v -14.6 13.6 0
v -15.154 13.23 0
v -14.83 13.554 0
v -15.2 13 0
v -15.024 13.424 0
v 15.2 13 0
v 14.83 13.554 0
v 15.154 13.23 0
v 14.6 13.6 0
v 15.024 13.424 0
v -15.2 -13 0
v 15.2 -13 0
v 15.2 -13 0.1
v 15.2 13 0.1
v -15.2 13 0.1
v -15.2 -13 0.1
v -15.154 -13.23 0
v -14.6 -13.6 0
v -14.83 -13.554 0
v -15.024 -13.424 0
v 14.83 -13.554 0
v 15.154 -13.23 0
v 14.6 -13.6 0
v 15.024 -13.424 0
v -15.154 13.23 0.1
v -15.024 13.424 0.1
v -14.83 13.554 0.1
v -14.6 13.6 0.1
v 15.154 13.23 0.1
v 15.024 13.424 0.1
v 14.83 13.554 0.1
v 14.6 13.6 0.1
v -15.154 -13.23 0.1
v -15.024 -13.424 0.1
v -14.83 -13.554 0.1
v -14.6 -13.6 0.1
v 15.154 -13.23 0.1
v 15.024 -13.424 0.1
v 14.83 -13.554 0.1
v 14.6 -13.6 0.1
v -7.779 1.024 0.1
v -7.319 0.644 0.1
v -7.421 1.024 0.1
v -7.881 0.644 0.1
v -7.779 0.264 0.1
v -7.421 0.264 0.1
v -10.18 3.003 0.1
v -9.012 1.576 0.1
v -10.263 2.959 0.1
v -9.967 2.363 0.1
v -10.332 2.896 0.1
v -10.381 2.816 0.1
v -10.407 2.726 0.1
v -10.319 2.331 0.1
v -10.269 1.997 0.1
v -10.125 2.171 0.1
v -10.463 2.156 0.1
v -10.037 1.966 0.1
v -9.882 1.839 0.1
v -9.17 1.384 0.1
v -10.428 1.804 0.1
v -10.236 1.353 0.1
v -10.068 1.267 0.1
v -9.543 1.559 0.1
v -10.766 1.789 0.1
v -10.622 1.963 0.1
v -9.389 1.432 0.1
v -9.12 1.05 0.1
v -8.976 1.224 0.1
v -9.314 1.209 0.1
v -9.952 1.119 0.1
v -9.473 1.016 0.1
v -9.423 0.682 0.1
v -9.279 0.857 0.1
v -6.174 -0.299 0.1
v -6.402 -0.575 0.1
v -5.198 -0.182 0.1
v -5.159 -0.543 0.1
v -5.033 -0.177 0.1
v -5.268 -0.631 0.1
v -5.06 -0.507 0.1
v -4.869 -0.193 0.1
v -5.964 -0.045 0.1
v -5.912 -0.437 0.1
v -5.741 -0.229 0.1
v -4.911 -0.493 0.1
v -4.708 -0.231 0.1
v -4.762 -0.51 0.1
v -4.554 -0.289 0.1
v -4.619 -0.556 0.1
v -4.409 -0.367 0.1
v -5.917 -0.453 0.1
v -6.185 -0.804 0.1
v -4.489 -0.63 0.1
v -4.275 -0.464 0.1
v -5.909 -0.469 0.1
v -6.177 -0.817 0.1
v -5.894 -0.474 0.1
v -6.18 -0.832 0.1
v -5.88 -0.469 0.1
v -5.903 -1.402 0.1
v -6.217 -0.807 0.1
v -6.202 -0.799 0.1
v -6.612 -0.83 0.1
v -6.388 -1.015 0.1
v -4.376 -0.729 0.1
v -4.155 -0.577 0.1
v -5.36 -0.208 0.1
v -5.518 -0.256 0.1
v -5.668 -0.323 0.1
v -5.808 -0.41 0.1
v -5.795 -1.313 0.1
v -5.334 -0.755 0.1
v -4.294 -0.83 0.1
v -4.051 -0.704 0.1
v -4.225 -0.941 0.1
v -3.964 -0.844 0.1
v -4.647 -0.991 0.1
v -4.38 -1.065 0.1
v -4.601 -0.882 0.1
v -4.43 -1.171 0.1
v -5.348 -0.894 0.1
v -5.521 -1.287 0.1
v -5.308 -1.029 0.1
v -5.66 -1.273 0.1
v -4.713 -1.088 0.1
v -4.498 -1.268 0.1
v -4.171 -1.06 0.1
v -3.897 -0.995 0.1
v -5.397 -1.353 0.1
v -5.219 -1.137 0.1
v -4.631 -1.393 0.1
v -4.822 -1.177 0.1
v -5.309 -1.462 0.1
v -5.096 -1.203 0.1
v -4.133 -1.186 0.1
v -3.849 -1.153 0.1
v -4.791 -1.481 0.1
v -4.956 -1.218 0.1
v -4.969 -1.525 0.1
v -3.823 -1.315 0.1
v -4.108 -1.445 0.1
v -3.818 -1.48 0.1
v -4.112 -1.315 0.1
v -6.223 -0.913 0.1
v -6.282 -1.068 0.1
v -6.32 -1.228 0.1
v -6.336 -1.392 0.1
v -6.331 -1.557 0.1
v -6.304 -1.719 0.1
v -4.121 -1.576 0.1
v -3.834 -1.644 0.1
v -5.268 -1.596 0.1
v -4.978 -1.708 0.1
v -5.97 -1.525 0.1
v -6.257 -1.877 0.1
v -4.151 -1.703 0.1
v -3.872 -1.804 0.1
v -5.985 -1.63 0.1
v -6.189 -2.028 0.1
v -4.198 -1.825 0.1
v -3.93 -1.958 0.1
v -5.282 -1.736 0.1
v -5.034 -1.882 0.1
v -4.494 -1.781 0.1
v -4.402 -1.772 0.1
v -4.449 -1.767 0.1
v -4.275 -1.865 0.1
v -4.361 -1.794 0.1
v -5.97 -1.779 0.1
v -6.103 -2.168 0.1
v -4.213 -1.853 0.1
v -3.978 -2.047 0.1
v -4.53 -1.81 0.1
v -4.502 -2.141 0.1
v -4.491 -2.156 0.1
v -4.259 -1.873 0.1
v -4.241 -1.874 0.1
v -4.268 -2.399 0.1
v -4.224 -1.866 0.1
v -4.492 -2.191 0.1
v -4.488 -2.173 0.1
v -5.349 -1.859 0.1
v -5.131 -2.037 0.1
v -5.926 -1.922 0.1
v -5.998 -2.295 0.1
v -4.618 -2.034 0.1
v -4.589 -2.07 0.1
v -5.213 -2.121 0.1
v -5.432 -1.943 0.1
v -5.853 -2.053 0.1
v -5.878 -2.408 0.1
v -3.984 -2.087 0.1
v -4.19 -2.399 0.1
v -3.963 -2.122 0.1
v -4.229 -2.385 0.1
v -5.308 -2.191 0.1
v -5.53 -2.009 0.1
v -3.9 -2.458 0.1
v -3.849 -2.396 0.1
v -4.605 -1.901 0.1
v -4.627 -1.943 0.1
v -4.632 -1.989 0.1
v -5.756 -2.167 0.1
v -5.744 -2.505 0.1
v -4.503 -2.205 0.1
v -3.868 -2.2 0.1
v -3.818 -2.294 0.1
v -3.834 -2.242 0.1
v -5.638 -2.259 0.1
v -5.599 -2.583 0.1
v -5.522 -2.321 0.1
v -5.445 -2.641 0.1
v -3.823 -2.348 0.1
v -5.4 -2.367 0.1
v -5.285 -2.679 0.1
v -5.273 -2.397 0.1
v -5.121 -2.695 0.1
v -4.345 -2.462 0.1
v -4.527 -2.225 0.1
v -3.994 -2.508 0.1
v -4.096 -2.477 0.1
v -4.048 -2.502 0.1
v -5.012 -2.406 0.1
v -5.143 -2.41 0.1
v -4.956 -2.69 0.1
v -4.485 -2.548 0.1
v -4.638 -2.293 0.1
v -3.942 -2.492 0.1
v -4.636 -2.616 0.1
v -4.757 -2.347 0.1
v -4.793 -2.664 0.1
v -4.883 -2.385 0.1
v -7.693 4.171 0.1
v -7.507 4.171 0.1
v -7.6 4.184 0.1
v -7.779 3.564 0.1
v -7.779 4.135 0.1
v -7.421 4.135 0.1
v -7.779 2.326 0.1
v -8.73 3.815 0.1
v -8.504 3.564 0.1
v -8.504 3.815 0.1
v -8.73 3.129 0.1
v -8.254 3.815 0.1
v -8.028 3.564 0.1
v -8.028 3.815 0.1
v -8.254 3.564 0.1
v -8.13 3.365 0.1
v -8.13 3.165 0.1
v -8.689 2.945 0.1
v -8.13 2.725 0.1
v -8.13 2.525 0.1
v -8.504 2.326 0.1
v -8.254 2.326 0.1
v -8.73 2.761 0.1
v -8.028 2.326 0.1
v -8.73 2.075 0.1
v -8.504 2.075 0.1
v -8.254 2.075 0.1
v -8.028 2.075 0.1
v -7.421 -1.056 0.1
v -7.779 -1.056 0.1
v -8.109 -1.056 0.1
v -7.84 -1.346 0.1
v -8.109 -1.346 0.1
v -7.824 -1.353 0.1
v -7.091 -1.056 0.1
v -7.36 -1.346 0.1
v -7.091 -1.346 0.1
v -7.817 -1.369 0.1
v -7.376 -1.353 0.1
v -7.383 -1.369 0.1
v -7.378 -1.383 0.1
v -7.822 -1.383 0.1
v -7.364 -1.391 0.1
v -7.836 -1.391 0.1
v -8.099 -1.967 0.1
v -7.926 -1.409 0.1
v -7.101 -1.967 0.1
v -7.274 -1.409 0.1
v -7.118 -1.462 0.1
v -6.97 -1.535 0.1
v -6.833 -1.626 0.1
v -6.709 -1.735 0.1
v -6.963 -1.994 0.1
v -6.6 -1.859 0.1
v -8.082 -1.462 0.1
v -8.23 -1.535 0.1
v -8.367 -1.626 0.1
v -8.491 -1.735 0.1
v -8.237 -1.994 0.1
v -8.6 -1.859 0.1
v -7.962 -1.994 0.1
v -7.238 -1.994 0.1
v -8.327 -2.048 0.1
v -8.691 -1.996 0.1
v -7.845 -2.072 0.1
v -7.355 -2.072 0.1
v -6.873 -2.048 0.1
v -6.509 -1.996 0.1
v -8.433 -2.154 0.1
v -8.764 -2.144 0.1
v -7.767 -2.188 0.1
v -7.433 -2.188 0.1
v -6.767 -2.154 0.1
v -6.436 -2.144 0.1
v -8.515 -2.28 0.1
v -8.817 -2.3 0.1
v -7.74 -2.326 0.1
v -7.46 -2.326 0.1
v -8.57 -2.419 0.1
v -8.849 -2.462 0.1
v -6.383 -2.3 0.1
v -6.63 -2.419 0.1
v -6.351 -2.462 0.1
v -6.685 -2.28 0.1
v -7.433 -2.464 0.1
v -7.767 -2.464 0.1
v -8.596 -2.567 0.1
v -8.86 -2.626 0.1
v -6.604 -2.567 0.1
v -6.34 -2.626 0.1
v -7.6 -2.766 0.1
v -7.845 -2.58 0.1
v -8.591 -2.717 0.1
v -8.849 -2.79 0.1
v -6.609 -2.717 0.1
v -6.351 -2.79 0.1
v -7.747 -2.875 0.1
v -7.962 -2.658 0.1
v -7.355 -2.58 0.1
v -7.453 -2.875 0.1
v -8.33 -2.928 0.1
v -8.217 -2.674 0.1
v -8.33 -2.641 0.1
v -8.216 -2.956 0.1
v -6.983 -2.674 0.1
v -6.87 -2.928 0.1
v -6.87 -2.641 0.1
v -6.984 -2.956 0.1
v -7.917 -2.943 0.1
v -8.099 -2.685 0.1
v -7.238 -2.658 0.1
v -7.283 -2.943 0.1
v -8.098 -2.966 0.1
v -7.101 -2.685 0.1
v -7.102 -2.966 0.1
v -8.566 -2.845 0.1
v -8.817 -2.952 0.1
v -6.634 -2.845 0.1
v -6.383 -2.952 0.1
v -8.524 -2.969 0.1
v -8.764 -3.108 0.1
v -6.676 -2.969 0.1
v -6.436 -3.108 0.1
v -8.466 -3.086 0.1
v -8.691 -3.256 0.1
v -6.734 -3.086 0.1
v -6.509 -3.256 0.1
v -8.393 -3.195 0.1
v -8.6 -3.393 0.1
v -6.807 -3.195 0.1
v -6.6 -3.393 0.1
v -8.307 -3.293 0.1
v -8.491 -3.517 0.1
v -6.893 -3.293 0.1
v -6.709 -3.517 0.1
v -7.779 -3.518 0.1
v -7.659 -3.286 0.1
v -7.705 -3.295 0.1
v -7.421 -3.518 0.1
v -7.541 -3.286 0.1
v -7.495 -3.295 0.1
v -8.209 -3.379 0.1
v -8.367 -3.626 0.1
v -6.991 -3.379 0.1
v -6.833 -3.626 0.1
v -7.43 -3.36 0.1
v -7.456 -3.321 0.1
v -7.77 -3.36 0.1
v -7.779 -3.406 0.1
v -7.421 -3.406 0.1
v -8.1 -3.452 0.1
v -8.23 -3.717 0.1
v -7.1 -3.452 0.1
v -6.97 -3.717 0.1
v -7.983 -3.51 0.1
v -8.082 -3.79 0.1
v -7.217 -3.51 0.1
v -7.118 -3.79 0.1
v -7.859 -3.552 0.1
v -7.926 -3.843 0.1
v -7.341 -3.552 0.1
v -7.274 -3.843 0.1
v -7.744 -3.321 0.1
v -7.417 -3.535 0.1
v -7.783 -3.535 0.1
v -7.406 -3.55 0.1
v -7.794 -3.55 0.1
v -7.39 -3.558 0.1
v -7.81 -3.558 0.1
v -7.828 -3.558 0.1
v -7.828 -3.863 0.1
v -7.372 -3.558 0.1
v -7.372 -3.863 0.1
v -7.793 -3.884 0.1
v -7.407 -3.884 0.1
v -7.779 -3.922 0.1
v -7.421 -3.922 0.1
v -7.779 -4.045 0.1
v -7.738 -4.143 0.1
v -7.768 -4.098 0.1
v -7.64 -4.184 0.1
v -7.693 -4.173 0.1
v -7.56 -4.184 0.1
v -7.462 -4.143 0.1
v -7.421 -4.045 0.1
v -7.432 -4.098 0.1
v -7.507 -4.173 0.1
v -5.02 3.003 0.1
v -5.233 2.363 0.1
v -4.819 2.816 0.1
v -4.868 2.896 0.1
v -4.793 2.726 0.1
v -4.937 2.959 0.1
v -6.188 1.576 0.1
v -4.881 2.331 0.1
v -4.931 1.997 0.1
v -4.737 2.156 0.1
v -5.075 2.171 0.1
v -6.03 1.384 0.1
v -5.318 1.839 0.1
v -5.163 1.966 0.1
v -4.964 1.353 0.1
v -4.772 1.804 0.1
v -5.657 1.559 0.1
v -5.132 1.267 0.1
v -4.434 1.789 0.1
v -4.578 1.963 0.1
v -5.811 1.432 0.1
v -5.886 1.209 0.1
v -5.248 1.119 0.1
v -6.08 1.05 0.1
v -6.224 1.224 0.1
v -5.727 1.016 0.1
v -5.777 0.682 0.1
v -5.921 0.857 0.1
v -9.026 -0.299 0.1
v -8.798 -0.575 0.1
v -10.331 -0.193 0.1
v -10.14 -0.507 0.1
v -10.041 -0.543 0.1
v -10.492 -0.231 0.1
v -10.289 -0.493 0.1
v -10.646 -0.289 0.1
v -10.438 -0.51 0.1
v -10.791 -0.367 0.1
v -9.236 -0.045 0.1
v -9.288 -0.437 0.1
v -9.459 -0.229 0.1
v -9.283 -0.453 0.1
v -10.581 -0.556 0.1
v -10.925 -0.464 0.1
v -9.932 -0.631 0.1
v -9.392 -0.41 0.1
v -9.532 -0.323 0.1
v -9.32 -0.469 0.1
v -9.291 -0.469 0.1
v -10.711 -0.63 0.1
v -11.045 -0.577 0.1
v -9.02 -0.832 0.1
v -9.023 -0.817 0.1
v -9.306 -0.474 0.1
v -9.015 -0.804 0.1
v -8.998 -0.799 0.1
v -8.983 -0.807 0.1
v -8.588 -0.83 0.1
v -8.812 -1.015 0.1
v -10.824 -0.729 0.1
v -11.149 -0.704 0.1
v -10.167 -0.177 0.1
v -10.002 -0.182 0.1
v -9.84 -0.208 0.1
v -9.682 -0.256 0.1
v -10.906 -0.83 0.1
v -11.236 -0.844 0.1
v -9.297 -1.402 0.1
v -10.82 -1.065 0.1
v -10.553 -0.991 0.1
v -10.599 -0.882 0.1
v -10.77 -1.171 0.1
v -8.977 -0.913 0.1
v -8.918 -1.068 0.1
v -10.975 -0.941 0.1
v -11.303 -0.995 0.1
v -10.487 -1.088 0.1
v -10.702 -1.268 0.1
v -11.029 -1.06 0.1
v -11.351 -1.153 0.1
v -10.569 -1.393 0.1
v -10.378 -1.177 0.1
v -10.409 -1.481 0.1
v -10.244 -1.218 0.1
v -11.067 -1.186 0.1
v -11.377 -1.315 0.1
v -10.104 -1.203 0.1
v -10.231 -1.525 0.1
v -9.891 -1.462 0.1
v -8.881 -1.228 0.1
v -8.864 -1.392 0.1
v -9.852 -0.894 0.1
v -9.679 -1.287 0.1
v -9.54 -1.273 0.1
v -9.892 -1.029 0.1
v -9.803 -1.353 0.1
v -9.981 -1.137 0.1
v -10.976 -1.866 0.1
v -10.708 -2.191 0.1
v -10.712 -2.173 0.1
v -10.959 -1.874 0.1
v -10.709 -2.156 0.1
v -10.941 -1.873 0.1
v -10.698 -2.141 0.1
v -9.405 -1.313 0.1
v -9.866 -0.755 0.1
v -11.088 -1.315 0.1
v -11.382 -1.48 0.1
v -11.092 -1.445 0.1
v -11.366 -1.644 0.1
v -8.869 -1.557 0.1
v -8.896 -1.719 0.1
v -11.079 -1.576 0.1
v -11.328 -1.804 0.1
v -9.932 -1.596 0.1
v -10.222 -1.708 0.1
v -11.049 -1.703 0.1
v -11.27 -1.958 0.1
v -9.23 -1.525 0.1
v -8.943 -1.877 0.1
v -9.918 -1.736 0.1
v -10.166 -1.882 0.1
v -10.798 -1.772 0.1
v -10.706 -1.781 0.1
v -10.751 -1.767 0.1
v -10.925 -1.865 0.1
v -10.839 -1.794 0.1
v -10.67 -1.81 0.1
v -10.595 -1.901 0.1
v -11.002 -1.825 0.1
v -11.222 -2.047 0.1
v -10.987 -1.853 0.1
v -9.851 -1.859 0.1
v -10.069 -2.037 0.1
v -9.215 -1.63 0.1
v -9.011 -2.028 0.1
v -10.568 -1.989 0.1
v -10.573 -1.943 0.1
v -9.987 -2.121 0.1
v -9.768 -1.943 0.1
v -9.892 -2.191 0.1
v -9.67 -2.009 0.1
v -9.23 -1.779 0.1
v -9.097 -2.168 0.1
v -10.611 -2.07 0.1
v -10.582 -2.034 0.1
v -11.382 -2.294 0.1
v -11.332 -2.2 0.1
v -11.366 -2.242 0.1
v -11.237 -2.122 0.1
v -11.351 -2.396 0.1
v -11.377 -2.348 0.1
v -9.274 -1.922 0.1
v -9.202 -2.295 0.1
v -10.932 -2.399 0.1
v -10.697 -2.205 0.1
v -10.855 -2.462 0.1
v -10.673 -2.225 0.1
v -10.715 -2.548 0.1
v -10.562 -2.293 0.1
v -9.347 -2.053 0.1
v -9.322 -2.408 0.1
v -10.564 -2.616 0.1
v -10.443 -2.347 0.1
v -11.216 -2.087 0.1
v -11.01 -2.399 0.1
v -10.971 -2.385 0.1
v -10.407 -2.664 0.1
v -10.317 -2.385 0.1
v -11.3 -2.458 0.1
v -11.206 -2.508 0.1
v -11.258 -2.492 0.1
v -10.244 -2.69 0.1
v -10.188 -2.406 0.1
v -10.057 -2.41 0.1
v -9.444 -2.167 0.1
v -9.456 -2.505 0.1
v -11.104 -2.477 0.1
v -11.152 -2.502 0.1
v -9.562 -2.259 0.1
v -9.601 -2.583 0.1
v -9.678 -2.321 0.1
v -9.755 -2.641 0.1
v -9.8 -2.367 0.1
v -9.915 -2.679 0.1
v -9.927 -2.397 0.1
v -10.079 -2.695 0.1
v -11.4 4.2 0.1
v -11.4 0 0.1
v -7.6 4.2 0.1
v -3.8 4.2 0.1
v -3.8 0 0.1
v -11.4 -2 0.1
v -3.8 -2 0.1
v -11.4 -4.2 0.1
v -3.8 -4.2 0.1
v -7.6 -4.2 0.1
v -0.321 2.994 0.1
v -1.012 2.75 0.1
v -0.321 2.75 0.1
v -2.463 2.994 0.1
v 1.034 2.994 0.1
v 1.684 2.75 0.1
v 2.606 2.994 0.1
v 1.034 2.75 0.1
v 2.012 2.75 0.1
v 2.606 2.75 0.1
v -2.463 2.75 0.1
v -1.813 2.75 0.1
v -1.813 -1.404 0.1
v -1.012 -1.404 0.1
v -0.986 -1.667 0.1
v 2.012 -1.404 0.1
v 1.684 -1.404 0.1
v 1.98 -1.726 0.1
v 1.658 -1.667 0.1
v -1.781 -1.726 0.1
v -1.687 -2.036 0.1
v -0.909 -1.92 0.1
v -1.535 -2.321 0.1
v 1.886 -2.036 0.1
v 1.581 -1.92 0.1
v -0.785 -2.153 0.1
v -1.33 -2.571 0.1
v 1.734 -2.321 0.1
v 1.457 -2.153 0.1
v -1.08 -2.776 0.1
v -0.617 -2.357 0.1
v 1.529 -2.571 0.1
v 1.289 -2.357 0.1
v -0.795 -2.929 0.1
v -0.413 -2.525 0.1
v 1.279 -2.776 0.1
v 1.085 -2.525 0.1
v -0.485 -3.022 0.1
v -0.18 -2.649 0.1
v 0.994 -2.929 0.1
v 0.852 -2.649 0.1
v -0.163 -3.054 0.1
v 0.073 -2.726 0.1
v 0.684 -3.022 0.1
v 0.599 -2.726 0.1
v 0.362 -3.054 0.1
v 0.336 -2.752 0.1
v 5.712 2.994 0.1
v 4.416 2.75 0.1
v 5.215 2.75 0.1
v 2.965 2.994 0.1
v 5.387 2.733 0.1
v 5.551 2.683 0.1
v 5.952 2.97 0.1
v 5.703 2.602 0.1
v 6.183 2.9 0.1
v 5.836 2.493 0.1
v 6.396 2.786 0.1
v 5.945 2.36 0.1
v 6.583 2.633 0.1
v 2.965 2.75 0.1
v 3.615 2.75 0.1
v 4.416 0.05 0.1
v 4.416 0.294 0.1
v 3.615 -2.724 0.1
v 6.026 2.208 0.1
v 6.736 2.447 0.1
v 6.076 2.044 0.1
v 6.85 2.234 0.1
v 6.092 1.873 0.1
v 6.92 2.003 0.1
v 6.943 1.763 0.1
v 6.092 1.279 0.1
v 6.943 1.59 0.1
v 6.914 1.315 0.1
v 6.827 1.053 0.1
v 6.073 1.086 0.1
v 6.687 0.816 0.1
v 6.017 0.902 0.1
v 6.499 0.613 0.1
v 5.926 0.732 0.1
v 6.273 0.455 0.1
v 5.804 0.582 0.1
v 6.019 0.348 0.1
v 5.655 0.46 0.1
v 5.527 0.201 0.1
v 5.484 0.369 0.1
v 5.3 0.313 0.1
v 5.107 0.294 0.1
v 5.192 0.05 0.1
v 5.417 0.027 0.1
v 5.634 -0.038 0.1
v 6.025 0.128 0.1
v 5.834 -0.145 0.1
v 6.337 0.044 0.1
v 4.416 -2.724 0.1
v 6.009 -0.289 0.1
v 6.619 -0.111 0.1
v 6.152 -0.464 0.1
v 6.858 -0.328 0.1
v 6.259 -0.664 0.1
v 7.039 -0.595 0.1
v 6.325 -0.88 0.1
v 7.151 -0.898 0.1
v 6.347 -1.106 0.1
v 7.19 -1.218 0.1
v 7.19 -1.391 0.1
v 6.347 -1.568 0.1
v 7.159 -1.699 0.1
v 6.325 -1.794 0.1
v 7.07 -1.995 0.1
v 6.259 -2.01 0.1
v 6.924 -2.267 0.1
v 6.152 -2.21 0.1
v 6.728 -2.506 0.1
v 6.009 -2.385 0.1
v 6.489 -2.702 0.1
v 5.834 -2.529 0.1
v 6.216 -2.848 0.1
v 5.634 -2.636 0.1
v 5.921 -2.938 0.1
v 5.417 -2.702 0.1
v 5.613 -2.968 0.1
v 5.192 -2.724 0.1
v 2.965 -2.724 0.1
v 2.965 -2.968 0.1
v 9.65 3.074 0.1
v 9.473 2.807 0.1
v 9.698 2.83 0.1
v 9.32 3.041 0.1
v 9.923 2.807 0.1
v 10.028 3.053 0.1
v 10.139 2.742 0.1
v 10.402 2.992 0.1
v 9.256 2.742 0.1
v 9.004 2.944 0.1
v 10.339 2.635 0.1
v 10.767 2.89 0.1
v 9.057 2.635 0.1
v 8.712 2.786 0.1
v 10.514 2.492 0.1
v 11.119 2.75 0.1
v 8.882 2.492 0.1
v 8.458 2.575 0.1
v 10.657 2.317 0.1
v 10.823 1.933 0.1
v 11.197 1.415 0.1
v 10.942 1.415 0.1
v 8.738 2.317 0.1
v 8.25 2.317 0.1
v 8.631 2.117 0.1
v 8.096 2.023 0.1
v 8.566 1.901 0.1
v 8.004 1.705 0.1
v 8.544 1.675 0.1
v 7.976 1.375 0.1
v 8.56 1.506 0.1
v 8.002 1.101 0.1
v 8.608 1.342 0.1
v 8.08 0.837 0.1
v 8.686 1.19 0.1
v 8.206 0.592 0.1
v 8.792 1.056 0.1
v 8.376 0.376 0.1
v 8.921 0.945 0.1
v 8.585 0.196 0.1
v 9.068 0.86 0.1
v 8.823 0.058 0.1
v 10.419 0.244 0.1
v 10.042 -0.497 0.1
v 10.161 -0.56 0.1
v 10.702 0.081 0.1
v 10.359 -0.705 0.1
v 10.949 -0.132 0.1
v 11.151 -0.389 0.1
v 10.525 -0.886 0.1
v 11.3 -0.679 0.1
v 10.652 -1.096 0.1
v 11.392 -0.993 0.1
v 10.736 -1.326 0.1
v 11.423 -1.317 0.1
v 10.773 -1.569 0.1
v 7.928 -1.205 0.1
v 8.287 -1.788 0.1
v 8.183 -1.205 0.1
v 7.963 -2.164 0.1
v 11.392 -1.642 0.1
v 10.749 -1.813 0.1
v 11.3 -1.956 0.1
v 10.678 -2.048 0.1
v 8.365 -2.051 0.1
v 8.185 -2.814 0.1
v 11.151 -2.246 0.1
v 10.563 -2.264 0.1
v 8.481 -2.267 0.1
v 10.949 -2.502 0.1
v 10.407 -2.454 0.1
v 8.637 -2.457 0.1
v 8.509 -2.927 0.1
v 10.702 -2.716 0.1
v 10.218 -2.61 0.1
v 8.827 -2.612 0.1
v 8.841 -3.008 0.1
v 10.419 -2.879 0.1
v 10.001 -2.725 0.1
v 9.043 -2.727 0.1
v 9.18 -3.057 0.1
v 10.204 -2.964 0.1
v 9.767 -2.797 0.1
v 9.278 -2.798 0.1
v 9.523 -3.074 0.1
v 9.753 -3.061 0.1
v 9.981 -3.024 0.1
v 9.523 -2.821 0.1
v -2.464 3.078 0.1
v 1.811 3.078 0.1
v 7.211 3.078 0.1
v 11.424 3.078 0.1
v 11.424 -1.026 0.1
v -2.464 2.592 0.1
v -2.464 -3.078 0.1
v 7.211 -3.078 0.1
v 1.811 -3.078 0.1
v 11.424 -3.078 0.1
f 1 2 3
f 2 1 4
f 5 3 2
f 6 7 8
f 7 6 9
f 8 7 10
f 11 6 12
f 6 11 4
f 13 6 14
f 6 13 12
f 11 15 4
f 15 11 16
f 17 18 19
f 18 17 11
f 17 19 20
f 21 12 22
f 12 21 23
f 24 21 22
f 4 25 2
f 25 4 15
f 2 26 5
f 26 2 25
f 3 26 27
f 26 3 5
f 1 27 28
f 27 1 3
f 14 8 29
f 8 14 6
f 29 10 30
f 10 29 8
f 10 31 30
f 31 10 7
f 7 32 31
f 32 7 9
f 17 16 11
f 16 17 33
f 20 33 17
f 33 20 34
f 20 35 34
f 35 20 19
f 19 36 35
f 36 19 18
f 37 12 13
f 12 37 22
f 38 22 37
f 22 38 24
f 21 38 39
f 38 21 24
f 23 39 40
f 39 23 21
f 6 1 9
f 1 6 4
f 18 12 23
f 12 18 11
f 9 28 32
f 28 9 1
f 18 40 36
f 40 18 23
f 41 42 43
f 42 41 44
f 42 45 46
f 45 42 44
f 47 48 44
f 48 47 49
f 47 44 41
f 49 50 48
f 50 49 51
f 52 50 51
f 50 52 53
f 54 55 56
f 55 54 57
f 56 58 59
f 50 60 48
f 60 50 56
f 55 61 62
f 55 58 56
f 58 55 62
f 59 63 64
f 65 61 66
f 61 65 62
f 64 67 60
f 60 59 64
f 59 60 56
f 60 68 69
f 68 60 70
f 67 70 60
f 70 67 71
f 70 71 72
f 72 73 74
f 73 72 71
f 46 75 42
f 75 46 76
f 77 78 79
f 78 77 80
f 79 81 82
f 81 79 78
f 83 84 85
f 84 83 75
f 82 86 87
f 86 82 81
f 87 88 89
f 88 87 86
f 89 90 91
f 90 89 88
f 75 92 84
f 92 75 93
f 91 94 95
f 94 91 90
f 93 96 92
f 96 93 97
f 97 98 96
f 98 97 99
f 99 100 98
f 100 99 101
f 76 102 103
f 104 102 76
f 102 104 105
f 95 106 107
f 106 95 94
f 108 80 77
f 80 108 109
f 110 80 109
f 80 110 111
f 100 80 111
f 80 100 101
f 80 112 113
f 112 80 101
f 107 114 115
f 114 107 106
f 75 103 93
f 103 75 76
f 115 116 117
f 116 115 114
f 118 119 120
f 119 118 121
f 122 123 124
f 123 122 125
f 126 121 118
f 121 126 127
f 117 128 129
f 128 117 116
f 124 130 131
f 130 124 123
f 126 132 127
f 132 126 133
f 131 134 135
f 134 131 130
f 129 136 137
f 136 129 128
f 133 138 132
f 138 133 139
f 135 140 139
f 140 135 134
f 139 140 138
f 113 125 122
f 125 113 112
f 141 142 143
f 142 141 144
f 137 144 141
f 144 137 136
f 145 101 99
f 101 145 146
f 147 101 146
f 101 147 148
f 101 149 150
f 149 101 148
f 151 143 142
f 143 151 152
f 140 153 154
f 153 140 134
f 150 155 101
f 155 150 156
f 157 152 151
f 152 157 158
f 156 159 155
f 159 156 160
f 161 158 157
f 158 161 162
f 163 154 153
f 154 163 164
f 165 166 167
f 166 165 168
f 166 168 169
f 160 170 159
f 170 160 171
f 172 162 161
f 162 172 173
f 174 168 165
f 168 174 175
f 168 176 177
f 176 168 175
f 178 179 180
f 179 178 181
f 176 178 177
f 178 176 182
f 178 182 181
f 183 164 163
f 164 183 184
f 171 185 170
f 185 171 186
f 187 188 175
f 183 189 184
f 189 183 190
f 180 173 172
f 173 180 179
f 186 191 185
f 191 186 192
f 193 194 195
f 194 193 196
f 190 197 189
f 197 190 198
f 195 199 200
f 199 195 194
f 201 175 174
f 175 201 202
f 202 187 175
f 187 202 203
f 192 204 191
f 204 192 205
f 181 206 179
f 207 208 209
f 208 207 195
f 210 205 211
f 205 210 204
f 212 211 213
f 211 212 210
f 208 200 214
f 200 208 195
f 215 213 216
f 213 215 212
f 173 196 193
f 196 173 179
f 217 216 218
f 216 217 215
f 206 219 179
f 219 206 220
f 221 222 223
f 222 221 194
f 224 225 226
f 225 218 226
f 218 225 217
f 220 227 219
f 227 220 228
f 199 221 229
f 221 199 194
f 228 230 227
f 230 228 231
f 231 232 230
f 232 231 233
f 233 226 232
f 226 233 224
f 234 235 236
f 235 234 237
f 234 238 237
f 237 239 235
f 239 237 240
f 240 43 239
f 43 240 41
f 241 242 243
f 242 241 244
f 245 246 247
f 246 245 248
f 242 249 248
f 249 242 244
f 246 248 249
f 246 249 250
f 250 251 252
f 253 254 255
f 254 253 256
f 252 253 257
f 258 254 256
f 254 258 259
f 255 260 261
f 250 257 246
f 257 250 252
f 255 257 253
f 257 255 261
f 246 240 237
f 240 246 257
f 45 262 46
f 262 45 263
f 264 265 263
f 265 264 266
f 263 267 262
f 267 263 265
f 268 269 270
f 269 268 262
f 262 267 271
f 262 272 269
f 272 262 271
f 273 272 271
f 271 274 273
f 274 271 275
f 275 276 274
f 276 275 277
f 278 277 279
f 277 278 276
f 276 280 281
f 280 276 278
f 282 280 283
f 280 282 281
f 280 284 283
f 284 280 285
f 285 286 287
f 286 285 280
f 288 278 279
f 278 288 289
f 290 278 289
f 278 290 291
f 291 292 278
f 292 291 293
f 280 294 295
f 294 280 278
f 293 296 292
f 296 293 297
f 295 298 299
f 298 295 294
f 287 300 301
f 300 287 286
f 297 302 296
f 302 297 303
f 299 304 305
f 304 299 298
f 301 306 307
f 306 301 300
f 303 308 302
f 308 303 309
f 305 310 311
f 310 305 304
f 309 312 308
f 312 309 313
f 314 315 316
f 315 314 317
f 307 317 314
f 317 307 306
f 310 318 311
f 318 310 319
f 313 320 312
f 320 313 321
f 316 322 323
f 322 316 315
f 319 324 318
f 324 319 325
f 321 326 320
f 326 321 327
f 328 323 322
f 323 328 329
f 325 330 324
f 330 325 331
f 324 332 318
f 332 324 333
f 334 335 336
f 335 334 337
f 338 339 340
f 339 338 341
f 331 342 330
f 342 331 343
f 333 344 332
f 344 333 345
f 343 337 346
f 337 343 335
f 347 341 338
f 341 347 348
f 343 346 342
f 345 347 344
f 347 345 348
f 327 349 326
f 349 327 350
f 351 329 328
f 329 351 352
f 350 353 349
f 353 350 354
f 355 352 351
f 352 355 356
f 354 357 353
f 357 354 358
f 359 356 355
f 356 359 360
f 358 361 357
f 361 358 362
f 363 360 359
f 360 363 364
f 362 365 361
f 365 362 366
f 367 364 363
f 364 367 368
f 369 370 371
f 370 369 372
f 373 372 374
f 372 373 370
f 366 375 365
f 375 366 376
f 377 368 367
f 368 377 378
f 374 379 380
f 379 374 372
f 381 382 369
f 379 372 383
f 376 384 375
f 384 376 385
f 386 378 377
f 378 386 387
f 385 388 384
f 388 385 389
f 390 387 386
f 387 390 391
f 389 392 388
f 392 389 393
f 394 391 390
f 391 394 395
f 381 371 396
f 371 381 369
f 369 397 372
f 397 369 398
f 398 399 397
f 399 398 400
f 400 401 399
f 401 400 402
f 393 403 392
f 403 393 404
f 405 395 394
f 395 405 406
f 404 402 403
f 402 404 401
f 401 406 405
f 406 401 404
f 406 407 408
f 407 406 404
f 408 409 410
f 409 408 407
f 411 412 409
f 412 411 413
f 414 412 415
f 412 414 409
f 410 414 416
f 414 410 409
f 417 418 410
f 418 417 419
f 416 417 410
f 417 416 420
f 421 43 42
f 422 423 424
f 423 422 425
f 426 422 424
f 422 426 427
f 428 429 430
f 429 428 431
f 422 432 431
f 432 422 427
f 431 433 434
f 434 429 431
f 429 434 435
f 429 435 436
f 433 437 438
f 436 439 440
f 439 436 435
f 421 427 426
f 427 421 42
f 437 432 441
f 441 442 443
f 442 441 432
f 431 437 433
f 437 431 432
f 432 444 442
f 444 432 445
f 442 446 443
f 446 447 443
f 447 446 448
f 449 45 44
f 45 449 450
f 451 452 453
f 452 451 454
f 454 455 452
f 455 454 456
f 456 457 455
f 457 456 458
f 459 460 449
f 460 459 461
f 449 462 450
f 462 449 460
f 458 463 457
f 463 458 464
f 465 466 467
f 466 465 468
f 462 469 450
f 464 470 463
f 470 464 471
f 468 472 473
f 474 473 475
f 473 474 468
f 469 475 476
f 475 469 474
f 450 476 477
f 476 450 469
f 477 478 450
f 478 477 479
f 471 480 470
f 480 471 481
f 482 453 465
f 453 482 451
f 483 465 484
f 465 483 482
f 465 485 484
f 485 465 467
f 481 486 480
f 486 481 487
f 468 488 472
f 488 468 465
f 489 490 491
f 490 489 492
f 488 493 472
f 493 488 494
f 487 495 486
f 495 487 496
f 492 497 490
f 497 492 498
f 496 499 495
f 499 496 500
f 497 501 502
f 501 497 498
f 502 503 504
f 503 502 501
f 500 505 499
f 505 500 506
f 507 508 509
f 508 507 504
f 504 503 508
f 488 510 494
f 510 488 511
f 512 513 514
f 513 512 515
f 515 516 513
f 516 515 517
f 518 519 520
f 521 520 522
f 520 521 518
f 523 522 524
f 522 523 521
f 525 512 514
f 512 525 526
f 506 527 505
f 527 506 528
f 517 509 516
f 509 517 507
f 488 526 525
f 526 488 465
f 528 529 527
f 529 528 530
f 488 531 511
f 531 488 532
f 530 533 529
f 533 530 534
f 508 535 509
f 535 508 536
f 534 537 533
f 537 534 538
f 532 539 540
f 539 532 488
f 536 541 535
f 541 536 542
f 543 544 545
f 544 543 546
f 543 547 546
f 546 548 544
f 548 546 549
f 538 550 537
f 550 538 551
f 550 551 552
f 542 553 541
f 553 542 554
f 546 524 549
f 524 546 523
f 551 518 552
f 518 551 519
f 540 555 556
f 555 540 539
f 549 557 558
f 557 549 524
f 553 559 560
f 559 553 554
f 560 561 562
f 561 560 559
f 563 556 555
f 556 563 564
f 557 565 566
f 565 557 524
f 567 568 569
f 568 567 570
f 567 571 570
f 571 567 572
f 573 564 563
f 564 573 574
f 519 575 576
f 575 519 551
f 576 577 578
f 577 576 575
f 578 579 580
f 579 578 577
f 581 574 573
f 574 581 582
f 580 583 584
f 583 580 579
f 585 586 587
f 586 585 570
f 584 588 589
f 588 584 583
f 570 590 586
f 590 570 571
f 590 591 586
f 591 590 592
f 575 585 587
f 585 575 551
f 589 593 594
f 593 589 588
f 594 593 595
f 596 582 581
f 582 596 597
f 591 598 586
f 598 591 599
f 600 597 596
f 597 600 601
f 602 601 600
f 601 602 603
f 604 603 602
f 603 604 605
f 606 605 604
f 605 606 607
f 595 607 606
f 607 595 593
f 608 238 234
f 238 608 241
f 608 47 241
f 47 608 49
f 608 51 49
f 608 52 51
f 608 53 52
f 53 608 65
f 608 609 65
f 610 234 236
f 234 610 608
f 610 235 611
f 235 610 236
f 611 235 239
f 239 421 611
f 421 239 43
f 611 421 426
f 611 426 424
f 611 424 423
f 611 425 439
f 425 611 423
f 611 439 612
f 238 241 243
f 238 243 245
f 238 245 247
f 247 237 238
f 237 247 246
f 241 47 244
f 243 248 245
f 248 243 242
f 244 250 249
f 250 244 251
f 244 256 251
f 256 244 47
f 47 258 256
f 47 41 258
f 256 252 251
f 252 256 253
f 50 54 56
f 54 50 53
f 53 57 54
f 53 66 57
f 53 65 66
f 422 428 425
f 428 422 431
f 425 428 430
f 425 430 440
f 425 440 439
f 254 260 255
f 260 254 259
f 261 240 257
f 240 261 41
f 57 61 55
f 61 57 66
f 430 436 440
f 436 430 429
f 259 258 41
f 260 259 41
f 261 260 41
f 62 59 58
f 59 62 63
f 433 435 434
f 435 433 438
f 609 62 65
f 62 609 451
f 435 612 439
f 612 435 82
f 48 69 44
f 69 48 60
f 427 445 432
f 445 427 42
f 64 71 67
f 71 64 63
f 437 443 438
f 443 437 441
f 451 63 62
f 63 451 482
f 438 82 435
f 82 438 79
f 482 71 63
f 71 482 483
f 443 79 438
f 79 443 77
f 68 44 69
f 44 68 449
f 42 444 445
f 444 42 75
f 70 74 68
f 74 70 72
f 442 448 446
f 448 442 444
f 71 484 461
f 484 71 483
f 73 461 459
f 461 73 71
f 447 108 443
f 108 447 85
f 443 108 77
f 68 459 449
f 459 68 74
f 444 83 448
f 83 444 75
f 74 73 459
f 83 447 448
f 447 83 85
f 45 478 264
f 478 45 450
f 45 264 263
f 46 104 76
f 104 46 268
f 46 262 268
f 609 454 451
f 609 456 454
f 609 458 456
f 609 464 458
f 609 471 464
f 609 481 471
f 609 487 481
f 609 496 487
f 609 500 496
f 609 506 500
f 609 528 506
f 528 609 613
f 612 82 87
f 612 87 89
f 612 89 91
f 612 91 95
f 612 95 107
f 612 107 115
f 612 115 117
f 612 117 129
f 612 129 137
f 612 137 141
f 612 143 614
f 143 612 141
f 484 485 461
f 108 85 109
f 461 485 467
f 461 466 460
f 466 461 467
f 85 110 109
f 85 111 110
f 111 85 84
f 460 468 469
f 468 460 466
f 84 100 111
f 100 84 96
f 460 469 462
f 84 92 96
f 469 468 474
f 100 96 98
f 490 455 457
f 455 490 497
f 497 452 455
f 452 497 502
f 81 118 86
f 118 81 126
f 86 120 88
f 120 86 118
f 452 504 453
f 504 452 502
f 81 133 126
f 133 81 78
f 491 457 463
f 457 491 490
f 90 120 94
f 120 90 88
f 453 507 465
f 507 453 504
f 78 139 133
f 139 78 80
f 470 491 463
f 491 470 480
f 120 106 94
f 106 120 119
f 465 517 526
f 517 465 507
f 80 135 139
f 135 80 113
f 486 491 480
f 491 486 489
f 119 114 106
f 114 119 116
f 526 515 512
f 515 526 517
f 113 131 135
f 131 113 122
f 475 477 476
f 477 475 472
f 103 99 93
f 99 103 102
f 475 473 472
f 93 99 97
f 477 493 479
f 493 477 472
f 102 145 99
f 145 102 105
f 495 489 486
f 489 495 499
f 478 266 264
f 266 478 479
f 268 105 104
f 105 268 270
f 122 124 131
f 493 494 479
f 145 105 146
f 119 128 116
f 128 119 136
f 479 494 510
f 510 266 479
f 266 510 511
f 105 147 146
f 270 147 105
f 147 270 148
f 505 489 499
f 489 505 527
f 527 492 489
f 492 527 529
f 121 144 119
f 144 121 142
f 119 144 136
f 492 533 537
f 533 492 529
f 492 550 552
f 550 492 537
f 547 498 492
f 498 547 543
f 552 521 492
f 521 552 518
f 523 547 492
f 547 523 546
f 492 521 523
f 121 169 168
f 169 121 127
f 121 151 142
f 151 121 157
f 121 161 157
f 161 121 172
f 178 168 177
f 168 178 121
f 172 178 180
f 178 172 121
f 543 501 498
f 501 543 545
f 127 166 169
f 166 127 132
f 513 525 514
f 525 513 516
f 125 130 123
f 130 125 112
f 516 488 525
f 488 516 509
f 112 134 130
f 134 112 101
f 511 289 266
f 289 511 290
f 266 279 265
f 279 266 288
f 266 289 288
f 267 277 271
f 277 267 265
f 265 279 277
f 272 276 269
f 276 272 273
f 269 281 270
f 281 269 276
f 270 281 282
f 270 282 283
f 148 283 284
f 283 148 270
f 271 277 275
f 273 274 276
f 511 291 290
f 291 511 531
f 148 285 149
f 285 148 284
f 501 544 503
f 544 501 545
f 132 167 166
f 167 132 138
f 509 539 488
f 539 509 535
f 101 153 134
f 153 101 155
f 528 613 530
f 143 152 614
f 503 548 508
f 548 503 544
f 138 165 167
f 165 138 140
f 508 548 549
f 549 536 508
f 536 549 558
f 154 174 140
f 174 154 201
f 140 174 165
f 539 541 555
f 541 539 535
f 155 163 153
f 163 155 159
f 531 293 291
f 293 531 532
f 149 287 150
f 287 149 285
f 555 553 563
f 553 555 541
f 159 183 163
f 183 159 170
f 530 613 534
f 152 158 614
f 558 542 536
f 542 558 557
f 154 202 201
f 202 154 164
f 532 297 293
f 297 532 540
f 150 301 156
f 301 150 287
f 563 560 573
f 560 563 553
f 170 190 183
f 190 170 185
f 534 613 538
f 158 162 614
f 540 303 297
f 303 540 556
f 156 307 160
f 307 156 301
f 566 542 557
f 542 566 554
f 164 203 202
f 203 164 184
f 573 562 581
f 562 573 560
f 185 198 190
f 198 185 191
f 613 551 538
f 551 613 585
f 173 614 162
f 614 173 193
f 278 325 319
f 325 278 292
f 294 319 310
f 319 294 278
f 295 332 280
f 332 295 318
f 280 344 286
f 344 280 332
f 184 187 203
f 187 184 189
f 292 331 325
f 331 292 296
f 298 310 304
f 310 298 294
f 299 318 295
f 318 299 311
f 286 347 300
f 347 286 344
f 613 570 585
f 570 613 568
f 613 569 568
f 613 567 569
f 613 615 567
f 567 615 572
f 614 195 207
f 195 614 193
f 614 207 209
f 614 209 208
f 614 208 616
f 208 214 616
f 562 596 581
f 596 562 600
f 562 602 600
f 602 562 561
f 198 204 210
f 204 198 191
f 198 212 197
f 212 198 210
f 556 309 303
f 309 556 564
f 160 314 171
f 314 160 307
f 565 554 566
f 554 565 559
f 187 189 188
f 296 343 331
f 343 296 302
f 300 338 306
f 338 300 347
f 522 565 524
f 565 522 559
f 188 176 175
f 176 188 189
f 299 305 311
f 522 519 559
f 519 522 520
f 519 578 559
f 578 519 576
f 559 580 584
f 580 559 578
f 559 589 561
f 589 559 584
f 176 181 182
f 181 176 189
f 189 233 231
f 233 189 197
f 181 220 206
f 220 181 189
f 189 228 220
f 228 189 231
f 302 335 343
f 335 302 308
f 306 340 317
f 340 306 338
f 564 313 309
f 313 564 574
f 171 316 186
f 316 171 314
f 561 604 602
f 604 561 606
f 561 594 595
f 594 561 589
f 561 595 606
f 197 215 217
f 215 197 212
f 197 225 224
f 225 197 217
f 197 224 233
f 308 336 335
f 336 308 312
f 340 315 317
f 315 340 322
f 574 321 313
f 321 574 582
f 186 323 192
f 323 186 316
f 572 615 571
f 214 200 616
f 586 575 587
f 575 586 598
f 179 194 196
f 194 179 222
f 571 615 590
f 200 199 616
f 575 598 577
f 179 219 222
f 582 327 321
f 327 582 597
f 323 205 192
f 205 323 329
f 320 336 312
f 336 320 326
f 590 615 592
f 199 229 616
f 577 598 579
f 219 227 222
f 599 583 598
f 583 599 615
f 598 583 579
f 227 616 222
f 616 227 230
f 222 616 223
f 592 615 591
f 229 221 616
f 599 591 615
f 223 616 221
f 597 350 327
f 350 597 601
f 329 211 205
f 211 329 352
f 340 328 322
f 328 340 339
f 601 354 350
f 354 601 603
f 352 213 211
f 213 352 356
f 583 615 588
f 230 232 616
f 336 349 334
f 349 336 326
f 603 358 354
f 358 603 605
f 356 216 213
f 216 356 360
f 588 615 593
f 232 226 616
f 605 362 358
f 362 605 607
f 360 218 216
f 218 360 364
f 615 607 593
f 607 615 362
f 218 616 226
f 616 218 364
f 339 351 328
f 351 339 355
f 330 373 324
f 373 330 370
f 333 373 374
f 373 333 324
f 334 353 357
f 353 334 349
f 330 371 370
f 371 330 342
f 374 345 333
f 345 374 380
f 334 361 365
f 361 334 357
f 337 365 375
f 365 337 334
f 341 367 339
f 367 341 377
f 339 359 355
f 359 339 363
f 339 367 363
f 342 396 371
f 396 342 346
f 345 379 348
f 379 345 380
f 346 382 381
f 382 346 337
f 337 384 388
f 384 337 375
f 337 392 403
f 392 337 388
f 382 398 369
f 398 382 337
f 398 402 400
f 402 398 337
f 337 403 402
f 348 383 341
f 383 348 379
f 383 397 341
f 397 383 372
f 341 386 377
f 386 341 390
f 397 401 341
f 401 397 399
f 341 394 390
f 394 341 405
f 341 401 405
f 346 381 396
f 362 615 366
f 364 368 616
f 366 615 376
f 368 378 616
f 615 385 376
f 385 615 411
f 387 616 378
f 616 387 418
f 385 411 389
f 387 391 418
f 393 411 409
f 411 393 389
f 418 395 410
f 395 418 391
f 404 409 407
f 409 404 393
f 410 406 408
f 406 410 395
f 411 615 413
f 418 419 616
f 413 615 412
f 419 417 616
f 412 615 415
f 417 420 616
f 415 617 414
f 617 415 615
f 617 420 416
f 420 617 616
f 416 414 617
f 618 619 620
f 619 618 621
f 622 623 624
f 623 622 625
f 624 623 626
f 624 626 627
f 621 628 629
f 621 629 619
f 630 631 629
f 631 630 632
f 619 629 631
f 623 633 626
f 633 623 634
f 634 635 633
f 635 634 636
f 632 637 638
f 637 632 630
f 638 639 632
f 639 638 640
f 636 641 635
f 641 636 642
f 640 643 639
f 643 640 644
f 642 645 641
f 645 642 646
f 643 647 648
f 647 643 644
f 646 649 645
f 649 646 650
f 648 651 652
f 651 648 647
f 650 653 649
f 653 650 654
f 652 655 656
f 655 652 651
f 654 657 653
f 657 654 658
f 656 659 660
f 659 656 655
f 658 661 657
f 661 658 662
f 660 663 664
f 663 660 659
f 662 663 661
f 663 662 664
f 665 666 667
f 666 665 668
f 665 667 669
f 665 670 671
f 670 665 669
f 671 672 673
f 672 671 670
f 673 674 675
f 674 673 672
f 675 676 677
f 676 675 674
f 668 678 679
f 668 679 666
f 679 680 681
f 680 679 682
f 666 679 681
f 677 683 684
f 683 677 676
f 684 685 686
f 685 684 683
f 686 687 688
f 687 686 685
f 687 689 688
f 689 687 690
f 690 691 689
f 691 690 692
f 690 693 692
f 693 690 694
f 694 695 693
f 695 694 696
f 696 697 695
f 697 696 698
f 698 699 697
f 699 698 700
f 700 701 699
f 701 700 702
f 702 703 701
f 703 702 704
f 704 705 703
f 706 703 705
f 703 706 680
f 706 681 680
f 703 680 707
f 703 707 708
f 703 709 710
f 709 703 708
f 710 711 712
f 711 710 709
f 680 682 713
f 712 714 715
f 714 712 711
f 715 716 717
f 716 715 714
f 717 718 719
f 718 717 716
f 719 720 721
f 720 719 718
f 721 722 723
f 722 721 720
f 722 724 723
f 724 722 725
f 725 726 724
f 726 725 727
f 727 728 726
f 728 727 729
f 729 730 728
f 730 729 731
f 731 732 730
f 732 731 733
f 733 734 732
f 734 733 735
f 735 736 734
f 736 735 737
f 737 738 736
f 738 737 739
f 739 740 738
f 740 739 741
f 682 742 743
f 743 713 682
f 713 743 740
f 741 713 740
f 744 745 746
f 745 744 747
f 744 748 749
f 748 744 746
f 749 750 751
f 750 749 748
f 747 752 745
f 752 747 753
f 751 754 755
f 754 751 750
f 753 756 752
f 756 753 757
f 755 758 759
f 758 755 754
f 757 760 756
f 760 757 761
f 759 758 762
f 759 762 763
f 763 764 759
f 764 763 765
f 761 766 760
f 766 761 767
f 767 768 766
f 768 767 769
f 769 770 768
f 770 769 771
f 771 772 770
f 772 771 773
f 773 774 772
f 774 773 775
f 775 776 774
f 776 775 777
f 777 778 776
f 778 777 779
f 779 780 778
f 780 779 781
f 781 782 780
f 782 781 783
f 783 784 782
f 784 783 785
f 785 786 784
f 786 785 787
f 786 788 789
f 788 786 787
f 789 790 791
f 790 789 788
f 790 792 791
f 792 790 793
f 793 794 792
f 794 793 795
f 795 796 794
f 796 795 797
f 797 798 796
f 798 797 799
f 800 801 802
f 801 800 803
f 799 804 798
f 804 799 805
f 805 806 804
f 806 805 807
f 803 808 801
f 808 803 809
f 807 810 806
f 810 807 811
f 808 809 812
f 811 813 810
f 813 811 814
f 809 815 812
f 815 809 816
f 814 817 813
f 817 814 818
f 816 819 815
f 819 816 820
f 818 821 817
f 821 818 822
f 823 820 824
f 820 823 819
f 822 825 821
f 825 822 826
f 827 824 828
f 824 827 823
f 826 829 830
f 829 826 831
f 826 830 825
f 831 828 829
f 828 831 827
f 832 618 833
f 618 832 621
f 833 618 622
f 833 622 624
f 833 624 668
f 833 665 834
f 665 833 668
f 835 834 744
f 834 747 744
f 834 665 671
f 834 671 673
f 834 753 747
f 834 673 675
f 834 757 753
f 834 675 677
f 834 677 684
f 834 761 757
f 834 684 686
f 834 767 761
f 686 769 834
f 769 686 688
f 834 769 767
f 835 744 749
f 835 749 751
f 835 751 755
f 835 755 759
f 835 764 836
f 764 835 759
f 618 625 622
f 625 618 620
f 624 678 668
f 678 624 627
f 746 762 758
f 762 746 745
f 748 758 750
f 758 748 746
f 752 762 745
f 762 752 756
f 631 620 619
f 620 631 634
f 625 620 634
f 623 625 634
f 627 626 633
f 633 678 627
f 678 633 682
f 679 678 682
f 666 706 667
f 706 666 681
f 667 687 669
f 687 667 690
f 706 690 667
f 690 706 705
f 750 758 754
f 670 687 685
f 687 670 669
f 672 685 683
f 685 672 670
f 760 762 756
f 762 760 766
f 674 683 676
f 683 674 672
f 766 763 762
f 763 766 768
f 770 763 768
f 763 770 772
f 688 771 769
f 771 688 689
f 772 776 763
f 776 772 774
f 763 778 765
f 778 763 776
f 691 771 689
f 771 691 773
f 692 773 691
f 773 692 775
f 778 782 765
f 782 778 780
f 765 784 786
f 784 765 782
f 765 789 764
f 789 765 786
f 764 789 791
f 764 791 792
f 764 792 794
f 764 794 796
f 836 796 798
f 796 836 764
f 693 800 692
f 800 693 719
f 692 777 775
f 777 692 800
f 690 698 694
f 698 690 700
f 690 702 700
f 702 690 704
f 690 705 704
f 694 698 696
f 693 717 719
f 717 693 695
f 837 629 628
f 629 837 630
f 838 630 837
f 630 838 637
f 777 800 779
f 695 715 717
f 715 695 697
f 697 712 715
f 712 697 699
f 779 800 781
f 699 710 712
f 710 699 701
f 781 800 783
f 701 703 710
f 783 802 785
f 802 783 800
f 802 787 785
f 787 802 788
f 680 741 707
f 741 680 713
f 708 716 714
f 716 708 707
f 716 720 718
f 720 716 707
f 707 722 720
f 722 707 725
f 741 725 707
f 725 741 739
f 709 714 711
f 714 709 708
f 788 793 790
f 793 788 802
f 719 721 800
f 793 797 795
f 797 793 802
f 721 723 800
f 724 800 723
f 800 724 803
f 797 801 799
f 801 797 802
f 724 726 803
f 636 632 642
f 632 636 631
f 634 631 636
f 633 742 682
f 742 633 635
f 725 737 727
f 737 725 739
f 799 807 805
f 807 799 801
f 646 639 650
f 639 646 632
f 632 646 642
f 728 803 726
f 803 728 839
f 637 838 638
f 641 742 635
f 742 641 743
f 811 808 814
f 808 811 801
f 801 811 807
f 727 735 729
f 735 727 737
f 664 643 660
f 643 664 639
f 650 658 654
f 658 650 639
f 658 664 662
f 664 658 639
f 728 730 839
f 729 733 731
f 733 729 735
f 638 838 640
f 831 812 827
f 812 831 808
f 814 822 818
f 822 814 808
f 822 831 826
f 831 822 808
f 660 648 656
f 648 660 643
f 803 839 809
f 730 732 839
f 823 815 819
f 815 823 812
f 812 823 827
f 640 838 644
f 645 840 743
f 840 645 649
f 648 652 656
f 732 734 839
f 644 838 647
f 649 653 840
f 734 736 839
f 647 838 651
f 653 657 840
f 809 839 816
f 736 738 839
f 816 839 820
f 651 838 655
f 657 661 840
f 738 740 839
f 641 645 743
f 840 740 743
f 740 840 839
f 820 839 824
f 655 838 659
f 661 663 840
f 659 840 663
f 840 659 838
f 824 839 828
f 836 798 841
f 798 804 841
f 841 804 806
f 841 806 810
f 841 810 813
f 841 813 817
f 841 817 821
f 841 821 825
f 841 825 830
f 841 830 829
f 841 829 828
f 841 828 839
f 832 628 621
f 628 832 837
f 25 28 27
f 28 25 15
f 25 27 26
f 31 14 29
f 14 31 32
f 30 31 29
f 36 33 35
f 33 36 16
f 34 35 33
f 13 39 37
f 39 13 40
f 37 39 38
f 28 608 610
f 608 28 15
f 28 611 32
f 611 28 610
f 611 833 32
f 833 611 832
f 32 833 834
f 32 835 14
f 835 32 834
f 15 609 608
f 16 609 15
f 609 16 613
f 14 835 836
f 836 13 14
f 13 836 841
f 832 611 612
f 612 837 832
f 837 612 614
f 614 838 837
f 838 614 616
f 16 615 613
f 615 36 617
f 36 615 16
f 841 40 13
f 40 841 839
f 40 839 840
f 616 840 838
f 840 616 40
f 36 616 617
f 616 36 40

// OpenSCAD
use <../lib.scad>
use <../p/1-4chrd.scad>
use <../p/logo-ubs-image-box.scad>
use <../p/logo-ubs-text-box.scad>
use <../p/logo-ubs-text.scad>
use <../p/logo-ubs.scad>
use <s/stickerback034x038.scad>
function ldraw_lib__6177973aa() = [
// 0 Sticker  3.4 x  3.8 with UBS Logo on White Background
// 0 Name: 6177973aa.dat
// 0 Author: Massimo Maso [Sirio]
// 0 !LDRAW_ORG Part UPDATE 2026-07
// 0 !LICENSE Licensed under CC BY 4.0 : see CAreadme.txt
// 
// 0 BFC CERTIFY CCW
  [0,"BFC","CERTIFY"],
  [0,"BFC","CCW"],
// 
// 0 !CATEGORY Sticker
// 0 !KEYWORDS 2016, 44, 6, AMG, BrickLink 75883stk01, Brickowl 129746, F1
// 0 !KEYWORDS Formula one, Hybrid, Lewis Hamilton, Mercedes, Nico Rosberg
// 0 !KEYWORDS Petronas, Rebrickable 30901, Set 75883, Speed Champions, Team
// 0 !KEYWORDS Toto Wolff, W07
// 
// 0 !HISTORY 2026-07-30 [OrionP] Official Update 2026-07
// 
// 0 // Stickerback
// 1 16 0 0 0 1 0 0 0 1 0 0 0 1 s\stickerback034x038.dat
  [1,16,0,0,0,1,0,0,0,1,0,0,0,1, ldraw_lib__s__stickerback034x038()],
// 0 // Logo primitives
// 1 0 -19 -.25 0 5 0 0 0 1 0 0 0 5 logo-ubs.dat
  [1,0,-19,-.25,0,5,0,0,0,1,0,0,0,5, ldraw_lib__logo_ubs()],
// 1 15 -19 -.25 0 5 0 0 0 1 0 0 0 5 logo-ubs-image-box.dat
  [1,15,-19,-.25,0,5,0,0,0,1,0,0,0,5, ldraw_lib__logo_ubs_image_box()],
// 1 4 11.2 -.25 0 5.4 0 0 0 1 0 0 0 5.4 logo-ubs-text.dat
  [1,4,11.2,-.25,0,5.4,0,0,0,1,0,0,0,5.4, ldraw_lib__logo_ubs_text()],
// 1 15 11.2 -.25 0 5.4 0 0 0 1 0 0 0 5.4 logo-ubs-text-box.dat
  [1,15,11.2,-.25,0,5.4,0,0,0,1,0,0,0,5.4, ldraw_lib__logo_ubs_text_box()],
// 0 // Primitives
// 1 15 -36.5 -.25 32.5 -1.5 0 0 0 1 0 0 0 1.5 1-4chrd.dat
  [1,15,-36.5,-.25,32.5,-1.5,0,0,0,1,0,0,0,1.5, ldraw_lib__1_4chrd()],
// 1 15 36.5 -.25 32.5 1.5 0 0 0 1 0 0 0 1.5 1-4chrd.dat
  [1,15,36.5,-.25,32.5,1.5,0,0,0,1,0,0,0,1.5, ldraw_lib__1_4chrd()],
// 1 15 -36.5 -.25 -32.5 -1.5 0 0 0 1 0 0 0 -1.5 1-4chrd.dat
  [1,15,-36.5,-.25,-32.5,-1.5,0,0,0,1,0,0,0,-1.5, ldraw_lib__1_4chrd()],
// 1 15 36.5 -.25 -32.5 1.5 0 0 0 1 0 0 0 -1.5 1-4chrd.dat
  [1,15,36.5,-.25,-32.5,1.5,0,0,0,1,0,0,0,-1.5, ldraw_lib__1_4chrd()],
// 0 // Top face
// 4 15 -36.5 -.25 34 -38 -.25 32.5 -28.5 -.25 10.5 -19 -.25 10.5
  [4,15,-36.5,-.25,34,-38,-.25,32.5,-28.5,-.25,10.5,-19,-.25,10.5],
// 4 15 -36.5 -.25 34 -19 -.25 10.5 -9.5 -.25 10.5 36.5 -.25 34
  [4,15,-36.5,-.25,34,-19,-.25,10.5,-9.5,-.25,10.5,36.5,-.25,34],
// 4 15 36.5 -.25 34 -9.5 -.25 10.5 -6.161 -.25 7.695 4.5283 -.25 7.695
  [4,15,36.5,-.25,34,-9.5,-.25,10.5,-6.161,-.25,7.695,4.5283,-.25,7.695],
// 3 15 36.5 -.25 34 4.5283 -.25 7.695 18.0283 -.25 7.695
  [3,15,36.5,-.25,34,4.5283,-.25,7.695,18.0283,-.25,7.695],
// 4 15 36.5 -.25 34 18.0283 -.25 7.695 28.561 -.25 7.695 38 -.25 32.5
  [4,15,36.5,-.25,34,18.0283,-.25,7.695,28.561,-.25,7.695,38,-.25,32.5],
// 3 15 -38 -.25 32.5 -28.5 -.25 0 -28.5 -.25 10.5
  [3,15,-38,-.25,32.5,-28.5,-.25,0,-28.5,-.25,10.5],
// 4 15 -38 -.25 -32.5 -28.5 -.25 -5 -28.5 -.25 0 -38 -.25 32.5
  [4,15,-38,-.25,-32.5,-28.5,-.25,-5,-28.5,-.25,0,-38,-.25,32.5],
// 3 15 38 -.25 32.5 28.561 -.25 7.695 28.561 -.25 -2.565
  [3,15,38,-.25,32.5,28.561,-.25,7.695,28.561,-.25,-2.565],
// 4 15 38 -.25 32.5 28.561 -.25 -2.565 28.561 -.25 -7.695 38 -.25 -32.5
  [4,15,38,-.25,32.5,28.561,-.25,-2.565,28.561,-.25,-7.695,38,-.25,-32.5],
// 3 15 -6.161 -.25 7.695 -9.5 -.25 10.5 -9.5 -.25 0
  [3,15,-6.161,-.25,7.695,-9.5,-.25,10.5,-9.5,-.25,0],
// 4 15 -9.5 -.25 0 -9.5 -.25 -5 -6.161 -.25 6.48 -6.161 -.25 7.695
  [4,15,-9.5,-.25,0,-9.5,-.25,-5,-6.161,-.25,6.48,-6.161,-.25,7.695],
// 4 15 -9.5 -.25 -5 -9.5 -.25 -10.5 -6.161 -.25 -7.695 -6.161 -.25 6.48
  [4,15,-9.5,-.25,-5,-9.5,-.25,-10.5,-6.161,-.25,-7.695,-6.161,-.25,6.48],
// 3 15 -38 -.25 -32.5 -28.5 -.25 -10.5 -28.5 -.25 -5
  [3,15,-38,-.25,-32.5,-28.5,-.25,-10.5,-28.5,-.25,-5],
// 4 15 -38 -.25 -32.5 -36.5 -.25 -34 -19 -.25 -10.5 -28.5 -.25 -10.5
  [4,15,-38,-.25,-32.5,-36.5,-.25,-34,-19,-.25,-10.5,-28.5,-.25,-10.5],
// 4 15 36.5 -.25 -34 38 -.25 -32.5 28.561 -.25 -7.695 18.0283 -.25 -7.695
  [4,15,36.5,-.25,-34,38,-.25,-32.5,28.561,-.25,-7.695,18.0283,-.25,-7.695],
// 3 15 36.5 -.25 -34 18.0283 -.25 -7.695 4.5283 -.25 -7.695
  [3,15,36.5,-.25,-34,18.0283,-.25,-7.695,4.5283,-.25,-7.695],
// 4 15 36.5 -.25 -34 4.5283 -.25 -7.695 -6.161 -.25 -7.695 -9.5 -.25 -10.5
  [4,15,36.5,-.25,-34,4.5283,-.25,-7.695,-6.161,-.25,-7.695,-9.5,-.25,-10.5],
// 4 15 36.5 -.25 -34 -9.5 -.25 -10.5 -19 -.25 -10.5 -36.5 -.25 -34
  [4,15,36.5,-.25,-34,-9.5,-.25,-10.5,-19,-.25,-10.5,-36.5,-.25,-34],
];
module ldraw_lib__6177973aa(step=0, col=false, unit=2/5, alt=false, line=0.2, solid=!$preview)
    makepoly(ldraw_lib__6177973aa(), step=step, col=col, unit=unit, alt=alt, line=line, solid=solid);
ldraw_lib__6177973aa(line=0.2);
